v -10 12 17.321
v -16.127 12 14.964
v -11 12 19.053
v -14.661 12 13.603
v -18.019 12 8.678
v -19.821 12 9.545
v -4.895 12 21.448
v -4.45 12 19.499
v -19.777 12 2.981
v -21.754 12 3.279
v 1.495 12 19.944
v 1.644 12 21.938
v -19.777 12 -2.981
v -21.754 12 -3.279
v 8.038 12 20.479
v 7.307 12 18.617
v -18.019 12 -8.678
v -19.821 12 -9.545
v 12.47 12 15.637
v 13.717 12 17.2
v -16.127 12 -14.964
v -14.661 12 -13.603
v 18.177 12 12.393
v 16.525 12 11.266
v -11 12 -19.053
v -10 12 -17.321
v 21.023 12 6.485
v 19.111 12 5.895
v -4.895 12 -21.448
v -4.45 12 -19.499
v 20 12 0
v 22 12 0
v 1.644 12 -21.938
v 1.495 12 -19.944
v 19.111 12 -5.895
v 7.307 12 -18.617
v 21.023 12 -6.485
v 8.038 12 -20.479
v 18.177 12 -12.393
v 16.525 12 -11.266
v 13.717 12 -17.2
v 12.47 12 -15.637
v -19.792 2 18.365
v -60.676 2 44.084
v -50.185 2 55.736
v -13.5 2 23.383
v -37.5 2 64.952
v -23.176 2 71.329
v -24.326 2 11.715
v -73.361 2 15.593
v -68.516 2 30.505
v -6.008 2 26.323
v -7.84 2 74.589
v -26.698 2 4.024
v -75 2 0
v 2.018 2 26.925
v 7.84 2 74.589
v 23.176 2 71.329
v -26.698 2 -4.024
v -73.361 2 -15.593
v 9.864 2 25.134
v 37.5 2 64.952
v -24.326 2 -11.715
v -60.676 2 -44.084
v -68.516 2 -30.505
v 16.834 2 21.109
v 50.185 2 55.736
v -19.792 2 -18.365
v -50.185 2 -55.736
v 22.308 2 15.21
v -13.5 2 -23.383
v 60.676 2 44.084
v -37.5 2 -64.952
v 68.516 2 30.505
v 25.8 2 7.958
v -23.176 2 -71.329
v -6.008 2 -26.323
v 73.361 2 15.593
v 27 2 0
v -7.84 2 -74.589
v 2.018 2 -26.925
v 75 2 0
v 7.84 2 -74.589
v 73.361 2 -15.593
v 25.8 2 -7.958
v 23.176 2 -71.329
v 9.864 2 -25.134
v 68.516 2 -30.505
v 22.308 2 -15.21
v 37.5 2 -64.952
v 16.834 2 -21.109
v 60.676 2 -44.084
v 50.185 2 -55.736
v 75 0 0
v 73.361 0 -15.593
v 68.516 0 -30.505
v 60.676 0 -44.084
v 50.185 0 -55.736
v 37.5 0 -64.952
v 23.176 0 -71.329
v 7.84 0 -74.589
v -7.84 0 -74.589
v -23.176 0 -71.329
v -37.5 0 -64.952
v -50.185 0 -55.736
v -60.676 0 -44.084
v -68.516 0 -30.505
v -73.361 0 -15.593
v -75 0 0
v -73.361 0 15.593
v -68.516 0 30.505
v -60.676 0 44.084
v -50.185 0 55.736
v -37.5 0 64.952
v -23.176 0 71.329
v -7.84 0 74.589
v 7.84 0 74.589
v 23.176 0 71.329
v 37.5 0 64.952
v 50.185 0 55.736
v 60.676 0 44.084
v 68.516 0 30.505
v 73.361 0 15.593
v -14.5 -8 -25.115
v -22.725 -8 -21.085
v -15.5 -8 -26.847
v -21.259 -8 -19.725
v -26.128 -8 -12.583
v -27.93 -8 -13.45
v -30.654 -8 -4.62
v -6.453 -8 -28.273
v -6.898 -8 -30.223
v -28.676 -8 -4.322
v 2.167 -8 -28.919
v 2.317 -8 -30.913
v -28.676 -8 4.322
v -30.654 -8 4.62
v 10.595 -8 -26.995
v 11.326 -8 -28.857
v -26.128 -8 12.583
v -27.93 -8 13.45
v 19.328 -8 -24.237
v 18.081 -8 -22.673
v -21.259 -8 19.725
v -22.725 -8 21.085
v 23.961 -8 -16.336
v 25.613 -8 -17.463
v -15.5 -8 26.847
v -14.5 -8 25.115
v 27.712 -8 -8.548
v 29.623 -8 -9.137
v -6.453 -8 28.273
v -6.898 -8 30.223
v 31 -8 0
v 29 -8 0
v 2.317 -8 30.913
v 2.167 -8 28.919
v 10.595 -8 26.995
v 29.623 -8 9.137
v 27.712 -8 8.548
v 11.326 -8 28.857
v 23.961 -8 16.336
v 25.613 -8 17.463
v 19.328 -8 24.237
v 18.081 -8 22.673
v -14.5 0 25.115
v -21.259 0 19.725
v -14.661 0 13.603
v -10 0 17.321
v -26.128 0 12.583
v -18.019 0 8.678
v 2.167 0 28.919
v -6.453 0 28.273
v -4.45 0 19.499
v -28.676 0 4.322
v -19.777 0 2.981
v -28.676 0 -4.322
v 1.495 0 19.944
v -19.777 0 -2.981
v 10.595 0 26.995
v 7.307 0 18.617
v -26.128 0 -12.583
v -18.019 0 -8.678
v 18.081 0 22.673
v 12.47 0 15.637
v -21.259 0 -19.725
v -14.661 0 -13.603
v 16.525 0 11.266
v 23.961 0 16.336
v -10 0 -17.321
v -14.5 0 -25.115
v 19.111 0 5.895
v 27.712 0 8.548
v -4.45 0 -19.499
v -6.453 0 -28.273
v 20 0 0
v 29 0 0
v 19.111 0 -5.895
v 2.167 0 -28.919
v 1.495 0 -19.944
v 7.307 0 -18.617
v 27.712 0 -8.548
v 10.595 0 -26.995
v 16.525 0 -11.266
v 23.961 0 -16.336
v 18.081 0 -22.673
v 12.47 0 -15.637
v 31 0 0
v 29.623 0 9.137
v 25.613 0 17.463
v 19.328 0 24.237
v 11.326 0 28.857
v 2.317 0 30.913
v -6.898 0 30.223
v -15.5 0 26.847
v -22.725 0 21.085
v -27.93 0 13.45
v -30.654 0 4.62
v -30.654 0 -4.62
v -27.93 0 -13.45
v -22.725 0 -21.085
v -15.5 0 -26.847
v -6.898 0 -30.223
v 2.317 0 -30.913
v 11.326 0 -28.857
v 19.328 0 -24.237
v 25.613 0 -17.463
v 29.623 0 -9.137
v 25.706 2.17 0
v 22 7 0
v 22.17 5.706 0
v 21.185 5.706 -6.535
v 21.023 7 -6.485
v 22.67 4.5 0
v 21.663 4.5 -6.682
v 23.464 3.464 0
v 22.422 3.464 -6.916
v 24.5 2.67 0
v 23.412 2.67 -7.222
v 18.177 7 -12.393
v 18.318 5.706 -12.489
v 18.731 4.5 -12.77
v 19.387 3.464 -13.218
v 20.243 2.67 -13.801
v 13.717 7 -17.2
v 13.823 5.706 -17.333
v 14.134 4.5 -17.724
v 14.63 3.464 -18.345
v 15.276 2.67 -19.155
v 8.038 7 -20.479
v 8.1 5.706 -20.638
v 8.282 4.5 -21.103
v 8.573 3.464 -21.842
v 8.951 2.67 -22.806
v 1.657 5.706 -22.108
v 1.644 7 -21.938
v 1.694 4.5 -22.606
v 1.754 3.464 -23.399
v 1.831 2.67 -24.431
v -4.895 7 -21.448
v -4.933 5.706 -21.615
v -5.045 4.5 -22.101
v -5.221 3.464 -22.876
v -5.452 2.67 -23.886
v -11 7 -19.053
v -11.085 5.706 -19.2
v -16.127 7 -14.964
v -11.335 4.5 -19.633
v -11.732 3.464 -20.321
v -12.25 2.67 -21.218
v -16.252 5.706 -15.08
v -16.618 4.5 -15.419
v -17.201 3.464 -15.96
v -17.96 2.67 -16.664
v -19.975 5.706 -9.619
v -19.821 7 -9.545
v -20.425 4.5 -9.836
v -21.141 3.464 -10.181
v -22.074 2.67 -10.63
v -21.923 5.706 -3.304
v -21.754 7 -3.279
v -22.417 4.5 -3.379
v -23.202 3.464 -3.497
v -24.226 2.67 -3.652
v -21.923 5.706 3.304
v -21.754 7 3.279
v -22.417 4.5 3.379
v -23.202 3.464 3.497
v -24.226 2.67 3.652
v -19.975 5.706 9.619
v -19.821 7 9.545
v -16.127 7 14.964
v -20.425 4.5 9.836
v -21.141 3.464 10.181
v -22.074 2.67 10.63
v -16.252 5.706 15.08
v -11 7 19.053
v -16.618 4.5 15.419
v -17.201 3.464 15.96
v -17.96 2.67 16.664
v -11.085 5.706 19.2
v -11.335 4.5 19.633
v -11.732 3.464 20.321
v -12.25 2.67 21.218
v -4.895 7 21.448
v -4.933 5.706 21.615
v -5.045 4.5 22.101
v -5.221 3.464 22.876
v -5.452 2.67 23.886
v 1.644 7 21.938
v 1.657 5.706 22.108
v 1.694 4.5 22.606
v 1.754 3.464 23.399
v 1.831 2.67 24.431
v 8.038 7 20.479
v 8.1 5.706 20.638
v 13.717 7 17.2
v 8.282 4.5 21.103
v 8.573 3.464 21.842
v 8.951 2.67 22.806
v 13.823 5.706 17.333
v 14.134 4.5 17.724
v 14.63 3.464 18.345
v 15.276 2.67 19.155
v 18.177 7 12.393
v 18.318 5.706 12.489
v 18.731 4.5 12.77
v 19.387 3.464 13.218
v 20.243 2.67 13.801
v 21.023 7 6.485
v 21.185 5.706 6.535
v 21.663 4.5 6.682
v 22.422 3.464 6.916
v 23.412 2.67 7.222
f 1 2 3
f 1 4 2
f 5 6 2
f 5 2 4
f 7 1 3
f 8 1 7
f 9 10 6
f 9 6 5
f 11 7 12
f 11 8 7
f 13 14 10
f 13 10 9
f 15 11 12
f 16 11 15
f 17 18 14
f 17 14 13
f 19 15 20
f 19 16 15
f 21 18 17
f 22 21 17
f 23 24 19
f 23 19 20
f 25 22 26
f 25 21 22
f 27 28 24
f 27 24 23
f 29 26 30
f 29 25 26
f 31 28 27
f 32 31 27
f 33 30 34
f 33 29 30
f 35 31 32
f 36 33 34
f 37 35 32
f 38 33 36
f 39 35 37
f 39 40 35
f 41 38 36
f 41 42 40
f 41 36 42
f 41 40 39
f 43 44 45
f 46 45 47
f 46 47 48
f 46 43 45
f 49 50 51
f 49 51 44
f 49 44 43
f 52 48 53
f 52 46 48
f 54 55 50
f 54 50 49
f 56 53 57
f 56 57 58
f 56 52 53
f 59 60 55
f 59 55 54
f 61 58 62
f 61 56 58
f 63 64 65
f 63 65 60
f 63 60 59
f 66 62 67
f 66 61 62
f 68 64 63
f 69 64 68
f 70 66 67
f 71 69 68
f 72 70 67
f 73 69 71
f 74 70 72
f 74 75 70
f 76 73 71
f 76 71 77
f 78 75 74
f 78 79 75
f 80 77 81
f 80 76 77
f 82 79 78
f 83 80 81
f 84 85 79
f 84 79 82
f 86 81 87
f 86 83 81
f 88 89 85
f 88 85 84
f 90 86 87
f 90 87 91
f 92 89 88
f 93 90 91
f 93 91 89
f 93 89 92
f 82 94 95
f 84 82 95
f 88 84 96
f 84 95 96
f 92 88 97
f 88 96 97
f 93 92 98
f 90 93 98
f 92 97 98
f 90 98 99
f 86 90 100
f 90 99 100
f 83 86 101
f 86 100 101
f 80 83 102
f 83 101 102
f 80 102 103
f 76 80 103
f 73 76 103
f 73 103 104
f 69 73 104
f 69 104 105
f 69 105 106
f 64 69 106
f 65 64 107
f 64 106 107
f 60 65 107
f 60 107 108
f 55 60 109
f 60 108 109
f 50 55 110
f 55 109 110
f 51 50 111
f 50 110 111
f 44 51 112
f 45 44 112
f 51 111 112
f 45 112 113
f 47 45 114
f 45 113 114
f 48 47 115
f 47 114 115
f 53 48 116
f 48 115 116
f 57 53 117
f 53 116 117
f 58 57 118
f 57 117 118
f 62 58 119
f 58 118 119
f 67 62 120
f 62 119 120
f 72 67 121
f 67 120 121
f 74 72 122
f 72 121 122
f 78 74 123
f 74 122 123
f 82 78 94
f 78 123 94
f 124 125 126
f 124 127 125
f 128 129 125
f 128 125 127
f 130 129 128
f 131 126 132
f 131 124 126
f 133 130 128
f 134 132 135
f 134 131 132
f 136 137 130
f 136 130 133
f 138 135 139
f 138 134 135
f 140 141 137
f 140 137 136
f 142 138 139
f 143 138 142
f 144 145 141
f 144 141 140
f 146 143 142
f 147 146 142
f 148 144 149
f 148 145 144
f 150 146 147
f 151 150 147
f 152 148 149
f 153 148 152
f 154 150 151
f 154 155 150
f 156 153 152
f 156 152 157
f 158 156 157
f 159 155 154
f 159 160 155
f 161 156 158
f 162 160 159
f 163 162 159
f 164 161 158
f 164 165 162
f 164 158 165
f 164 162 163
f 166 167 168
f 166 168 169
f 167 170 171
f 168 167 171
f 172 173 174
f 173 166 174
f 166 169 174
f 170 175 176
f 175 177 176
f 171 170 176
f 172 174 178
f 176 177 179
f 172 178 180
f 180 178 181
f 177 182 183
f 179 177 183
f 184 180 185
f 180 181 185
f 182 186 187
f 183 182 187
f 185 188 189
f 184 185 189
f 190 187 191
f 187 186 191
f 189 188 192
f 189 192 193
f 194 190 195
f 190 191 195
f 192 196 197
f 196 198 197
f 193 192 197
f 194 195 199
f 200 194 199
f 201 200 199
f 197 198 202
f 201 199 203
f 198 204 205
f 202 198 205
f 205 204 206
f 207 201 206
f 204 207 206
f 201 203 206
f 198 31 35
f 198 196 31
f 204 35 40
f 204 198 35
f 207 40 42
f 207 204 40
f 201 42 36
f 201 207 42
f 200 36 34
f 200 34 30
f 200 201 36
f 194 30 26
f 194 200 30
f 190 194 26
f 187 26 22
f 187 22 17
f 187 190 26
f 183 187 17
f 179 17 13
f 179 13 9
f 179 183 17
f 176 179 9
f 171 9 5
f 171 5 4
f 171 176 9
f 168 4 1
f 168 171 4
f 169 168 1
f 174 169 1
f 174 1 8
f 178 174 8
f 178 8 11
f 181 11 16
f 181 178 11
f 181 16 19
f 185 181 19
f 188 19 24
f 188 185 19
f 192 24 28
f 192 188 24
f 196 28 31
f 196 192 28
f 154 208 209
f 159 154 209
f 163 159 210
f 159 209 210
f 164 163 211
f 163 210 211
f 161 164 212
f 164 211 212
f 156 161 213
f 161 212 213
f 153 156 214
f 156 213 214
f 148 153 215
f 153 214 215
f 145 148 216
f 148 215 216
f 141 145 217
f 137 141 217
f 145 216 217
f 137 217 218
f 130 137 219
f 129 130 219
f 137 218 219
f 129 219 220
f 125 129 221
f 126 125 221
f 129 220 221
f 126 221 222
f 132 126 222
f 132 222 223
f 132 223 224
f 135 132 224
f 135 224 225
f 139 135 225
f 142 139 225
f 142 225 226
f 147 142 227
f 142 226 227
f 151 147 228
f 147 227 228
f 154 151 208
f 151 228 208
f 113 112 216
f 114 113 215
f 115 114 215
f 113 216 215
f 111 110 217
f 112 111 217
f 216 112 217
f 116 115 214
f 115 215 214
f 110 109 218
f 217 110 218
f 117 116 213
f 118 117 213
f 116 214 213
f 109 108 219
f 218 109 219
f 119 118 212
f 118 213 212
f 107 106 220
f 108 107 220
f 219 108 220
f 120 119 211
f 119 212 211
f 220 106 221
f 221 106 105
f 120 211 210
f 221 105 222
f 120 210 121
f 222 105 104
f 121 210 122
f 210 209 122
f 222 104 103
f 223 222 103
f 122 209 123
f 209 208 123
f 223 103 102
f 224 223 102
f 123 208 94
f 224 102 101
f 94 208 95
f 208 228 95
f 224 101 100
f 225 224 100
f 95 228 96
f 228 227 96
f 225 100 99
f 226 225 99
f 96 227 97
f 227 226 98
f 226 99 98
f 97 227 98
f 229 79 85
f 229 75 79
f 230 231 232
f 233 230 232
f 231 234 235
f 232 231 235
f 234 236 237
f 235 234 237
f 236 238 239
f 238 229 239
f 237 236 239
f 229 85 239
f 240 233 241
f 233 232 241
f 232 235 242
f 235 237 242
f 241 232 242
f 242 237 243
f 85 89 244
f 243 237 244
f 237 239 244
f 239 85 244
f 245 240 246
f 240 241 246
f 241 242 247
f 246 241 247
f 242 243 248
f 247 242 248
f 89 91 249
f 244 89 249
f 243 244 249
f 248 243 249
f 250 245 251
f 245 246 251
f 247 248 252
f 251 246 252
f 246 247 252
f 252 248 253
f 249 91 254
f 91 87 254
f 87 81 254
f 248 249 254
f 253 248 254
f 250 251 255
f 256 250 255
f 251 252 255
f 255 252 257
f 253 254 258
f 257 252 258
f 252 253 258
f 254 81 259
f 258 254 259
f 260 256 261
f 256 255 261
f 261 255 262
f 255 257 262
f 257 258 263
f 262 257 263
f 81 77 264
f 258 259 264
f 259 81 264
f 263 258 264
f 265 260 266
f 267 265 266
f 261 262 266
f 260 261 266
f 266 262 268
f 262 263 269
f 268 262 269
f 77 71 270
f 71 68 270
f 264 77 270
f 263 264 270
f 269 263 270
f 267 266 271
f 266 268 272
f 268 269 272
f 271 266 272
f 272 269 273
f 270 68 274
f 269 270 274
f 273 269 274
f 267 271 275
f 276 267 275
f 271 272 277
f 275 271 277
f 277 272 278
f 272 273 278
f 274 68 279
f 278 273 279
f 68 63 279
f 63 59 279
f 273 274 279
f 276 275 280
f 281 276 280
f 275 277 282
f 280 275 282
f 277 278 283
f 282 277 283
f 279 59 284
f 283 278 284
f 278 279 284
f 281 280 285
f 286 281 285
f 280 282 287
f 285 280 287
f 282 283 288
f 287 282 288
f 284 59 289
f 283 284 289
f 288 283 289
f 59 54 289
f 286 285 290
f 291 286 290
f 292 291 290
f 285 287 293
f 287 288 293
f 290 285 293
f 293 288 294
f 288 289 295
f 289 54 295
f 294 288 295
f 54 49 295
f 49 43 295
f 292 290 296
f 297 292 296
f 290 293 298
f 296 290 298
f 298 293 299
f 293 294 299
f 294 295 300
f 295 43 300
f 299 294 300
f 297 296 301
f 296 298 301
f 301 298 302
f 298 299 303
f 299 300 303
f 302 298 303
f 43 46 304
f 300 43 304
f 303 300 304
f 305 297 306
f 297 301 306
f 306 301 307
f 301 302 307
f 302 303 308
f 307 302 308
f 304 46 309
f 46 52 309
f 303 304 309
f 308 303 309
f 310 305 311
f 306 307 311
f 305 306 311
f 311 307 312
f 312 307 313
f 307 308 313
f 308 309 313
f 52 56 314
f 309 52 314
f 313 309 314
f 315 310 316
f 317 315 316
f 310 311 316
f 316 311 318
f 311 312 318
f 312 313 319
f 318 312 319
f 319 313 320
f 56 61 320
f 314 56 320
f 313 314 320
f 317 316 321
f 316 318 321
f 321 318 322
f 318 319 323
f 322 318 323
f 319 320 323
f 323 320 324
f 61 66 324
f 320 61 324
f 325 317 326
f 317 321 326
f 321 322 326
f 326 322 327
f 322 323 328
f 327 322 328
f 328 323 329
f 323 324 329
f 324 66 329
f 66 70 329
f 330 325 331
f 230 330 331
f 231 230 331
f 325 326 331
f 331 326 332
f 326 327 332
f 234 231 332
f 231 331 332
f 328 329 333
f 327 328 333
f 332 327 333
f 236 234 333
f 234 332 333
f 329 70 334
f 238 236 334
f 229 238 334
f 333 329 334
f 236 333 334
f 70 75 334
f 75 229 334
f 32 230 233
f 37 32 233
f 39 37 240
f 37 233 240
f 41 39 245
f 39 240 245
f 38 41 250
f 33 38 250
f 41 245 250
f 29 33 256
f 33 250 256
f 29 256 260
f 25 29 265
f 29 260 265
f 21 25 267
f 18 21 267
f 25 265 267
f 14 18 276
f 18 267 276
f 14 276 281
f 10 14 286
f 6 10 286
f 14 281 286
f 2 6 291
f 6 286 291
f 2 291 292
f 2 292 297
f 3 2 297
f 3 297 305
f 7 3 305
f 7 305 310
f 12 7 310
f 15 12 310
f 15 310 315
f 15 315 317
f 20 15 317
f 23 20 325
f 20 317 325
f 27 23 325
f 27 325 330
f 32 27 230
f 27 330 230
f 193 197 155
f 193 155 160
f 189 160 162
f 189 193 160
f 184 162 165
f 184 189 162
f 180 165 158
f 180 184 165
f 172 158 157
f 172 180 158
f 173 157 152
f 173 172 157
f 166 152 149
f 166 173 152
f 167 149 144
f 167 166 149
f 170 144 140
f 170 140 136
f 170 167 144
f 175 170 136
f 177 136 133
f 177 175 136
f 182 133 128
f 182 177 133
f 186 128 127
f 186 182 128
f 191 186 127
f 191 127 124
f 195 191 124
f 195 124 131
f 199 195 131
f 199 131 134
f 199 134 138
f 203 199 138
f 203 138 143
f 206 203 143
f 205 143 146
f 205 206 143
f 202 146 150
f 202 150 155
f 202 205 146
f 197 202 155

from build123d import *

# Parameters (mm, degrees)
SKETCH1_R           = 75
BOSS_EXTRUDE1_DEPTH = 2
SKETCH2_R           = 31
SKETCH2_R_2         = 29
EXTRUDE_THIN1_DEPTH = 8
SKETCH3_R           = 20
CUT_EXTRUDE1_DEPTH  = 3
SKETCH4_R           = 22
SKETCH4_R_2         = 20
EXTRUDE_THIN2_DEPTH = 10
FILLET1_R           = 5


with BuildPart() as part:
    # Sketch1 → Boss-Extrude1 (new body)
    with BuildSketch(Plane(origin=(0, 0, 0), x_dir=(1, 0, 0), z_dir=(0, 1, 0))):
        Circle(SKETCH1_R)
    extrude(amount=BOSS_EXTRUDE1_DEPTH)

    # Sketch2 → Extrude-Thin1 (add)
    with BuildSketch(Plane.XZ):
        Circle(SKETCH2_R)
        Circle(SKETCH2_R_2, mode=Mode.SUBTRACT)
    extrude(amount=EXTRUDE_THIN1_DEPTH)

    # Sketch3 → Cut-Extrude1 (cut, through all)
    with BuildSketch(Plane.XZ):
        Circle(SKETCH3_R)
    extrude(amount=-CUT_EXTRUDE1_DEPTH, mode=Mode.SUBTRACT)

    # Sketch4 → Extrude-Thin2 (add)
    with BuildSketch(Plane(origin=(0, 2, 0), x_dir=(1, 0, 0), z_dir=(0, 1, 0))):
        Circle(SKETCH4_R)
        Circle(SKETCH4_R_2, mode=Mode.SUBTRACT)
    extrude(amount=EXTRUDE_THIN2_DEPTH)

    # Fillet1
    fillet1_edges = [part.edges().sort_by_distance(p)[0] for p in [
        (-22, 2, 0),
    ]]
    fillet(fillet1_edges, radius=FILLET1_R)


solid = part.part
